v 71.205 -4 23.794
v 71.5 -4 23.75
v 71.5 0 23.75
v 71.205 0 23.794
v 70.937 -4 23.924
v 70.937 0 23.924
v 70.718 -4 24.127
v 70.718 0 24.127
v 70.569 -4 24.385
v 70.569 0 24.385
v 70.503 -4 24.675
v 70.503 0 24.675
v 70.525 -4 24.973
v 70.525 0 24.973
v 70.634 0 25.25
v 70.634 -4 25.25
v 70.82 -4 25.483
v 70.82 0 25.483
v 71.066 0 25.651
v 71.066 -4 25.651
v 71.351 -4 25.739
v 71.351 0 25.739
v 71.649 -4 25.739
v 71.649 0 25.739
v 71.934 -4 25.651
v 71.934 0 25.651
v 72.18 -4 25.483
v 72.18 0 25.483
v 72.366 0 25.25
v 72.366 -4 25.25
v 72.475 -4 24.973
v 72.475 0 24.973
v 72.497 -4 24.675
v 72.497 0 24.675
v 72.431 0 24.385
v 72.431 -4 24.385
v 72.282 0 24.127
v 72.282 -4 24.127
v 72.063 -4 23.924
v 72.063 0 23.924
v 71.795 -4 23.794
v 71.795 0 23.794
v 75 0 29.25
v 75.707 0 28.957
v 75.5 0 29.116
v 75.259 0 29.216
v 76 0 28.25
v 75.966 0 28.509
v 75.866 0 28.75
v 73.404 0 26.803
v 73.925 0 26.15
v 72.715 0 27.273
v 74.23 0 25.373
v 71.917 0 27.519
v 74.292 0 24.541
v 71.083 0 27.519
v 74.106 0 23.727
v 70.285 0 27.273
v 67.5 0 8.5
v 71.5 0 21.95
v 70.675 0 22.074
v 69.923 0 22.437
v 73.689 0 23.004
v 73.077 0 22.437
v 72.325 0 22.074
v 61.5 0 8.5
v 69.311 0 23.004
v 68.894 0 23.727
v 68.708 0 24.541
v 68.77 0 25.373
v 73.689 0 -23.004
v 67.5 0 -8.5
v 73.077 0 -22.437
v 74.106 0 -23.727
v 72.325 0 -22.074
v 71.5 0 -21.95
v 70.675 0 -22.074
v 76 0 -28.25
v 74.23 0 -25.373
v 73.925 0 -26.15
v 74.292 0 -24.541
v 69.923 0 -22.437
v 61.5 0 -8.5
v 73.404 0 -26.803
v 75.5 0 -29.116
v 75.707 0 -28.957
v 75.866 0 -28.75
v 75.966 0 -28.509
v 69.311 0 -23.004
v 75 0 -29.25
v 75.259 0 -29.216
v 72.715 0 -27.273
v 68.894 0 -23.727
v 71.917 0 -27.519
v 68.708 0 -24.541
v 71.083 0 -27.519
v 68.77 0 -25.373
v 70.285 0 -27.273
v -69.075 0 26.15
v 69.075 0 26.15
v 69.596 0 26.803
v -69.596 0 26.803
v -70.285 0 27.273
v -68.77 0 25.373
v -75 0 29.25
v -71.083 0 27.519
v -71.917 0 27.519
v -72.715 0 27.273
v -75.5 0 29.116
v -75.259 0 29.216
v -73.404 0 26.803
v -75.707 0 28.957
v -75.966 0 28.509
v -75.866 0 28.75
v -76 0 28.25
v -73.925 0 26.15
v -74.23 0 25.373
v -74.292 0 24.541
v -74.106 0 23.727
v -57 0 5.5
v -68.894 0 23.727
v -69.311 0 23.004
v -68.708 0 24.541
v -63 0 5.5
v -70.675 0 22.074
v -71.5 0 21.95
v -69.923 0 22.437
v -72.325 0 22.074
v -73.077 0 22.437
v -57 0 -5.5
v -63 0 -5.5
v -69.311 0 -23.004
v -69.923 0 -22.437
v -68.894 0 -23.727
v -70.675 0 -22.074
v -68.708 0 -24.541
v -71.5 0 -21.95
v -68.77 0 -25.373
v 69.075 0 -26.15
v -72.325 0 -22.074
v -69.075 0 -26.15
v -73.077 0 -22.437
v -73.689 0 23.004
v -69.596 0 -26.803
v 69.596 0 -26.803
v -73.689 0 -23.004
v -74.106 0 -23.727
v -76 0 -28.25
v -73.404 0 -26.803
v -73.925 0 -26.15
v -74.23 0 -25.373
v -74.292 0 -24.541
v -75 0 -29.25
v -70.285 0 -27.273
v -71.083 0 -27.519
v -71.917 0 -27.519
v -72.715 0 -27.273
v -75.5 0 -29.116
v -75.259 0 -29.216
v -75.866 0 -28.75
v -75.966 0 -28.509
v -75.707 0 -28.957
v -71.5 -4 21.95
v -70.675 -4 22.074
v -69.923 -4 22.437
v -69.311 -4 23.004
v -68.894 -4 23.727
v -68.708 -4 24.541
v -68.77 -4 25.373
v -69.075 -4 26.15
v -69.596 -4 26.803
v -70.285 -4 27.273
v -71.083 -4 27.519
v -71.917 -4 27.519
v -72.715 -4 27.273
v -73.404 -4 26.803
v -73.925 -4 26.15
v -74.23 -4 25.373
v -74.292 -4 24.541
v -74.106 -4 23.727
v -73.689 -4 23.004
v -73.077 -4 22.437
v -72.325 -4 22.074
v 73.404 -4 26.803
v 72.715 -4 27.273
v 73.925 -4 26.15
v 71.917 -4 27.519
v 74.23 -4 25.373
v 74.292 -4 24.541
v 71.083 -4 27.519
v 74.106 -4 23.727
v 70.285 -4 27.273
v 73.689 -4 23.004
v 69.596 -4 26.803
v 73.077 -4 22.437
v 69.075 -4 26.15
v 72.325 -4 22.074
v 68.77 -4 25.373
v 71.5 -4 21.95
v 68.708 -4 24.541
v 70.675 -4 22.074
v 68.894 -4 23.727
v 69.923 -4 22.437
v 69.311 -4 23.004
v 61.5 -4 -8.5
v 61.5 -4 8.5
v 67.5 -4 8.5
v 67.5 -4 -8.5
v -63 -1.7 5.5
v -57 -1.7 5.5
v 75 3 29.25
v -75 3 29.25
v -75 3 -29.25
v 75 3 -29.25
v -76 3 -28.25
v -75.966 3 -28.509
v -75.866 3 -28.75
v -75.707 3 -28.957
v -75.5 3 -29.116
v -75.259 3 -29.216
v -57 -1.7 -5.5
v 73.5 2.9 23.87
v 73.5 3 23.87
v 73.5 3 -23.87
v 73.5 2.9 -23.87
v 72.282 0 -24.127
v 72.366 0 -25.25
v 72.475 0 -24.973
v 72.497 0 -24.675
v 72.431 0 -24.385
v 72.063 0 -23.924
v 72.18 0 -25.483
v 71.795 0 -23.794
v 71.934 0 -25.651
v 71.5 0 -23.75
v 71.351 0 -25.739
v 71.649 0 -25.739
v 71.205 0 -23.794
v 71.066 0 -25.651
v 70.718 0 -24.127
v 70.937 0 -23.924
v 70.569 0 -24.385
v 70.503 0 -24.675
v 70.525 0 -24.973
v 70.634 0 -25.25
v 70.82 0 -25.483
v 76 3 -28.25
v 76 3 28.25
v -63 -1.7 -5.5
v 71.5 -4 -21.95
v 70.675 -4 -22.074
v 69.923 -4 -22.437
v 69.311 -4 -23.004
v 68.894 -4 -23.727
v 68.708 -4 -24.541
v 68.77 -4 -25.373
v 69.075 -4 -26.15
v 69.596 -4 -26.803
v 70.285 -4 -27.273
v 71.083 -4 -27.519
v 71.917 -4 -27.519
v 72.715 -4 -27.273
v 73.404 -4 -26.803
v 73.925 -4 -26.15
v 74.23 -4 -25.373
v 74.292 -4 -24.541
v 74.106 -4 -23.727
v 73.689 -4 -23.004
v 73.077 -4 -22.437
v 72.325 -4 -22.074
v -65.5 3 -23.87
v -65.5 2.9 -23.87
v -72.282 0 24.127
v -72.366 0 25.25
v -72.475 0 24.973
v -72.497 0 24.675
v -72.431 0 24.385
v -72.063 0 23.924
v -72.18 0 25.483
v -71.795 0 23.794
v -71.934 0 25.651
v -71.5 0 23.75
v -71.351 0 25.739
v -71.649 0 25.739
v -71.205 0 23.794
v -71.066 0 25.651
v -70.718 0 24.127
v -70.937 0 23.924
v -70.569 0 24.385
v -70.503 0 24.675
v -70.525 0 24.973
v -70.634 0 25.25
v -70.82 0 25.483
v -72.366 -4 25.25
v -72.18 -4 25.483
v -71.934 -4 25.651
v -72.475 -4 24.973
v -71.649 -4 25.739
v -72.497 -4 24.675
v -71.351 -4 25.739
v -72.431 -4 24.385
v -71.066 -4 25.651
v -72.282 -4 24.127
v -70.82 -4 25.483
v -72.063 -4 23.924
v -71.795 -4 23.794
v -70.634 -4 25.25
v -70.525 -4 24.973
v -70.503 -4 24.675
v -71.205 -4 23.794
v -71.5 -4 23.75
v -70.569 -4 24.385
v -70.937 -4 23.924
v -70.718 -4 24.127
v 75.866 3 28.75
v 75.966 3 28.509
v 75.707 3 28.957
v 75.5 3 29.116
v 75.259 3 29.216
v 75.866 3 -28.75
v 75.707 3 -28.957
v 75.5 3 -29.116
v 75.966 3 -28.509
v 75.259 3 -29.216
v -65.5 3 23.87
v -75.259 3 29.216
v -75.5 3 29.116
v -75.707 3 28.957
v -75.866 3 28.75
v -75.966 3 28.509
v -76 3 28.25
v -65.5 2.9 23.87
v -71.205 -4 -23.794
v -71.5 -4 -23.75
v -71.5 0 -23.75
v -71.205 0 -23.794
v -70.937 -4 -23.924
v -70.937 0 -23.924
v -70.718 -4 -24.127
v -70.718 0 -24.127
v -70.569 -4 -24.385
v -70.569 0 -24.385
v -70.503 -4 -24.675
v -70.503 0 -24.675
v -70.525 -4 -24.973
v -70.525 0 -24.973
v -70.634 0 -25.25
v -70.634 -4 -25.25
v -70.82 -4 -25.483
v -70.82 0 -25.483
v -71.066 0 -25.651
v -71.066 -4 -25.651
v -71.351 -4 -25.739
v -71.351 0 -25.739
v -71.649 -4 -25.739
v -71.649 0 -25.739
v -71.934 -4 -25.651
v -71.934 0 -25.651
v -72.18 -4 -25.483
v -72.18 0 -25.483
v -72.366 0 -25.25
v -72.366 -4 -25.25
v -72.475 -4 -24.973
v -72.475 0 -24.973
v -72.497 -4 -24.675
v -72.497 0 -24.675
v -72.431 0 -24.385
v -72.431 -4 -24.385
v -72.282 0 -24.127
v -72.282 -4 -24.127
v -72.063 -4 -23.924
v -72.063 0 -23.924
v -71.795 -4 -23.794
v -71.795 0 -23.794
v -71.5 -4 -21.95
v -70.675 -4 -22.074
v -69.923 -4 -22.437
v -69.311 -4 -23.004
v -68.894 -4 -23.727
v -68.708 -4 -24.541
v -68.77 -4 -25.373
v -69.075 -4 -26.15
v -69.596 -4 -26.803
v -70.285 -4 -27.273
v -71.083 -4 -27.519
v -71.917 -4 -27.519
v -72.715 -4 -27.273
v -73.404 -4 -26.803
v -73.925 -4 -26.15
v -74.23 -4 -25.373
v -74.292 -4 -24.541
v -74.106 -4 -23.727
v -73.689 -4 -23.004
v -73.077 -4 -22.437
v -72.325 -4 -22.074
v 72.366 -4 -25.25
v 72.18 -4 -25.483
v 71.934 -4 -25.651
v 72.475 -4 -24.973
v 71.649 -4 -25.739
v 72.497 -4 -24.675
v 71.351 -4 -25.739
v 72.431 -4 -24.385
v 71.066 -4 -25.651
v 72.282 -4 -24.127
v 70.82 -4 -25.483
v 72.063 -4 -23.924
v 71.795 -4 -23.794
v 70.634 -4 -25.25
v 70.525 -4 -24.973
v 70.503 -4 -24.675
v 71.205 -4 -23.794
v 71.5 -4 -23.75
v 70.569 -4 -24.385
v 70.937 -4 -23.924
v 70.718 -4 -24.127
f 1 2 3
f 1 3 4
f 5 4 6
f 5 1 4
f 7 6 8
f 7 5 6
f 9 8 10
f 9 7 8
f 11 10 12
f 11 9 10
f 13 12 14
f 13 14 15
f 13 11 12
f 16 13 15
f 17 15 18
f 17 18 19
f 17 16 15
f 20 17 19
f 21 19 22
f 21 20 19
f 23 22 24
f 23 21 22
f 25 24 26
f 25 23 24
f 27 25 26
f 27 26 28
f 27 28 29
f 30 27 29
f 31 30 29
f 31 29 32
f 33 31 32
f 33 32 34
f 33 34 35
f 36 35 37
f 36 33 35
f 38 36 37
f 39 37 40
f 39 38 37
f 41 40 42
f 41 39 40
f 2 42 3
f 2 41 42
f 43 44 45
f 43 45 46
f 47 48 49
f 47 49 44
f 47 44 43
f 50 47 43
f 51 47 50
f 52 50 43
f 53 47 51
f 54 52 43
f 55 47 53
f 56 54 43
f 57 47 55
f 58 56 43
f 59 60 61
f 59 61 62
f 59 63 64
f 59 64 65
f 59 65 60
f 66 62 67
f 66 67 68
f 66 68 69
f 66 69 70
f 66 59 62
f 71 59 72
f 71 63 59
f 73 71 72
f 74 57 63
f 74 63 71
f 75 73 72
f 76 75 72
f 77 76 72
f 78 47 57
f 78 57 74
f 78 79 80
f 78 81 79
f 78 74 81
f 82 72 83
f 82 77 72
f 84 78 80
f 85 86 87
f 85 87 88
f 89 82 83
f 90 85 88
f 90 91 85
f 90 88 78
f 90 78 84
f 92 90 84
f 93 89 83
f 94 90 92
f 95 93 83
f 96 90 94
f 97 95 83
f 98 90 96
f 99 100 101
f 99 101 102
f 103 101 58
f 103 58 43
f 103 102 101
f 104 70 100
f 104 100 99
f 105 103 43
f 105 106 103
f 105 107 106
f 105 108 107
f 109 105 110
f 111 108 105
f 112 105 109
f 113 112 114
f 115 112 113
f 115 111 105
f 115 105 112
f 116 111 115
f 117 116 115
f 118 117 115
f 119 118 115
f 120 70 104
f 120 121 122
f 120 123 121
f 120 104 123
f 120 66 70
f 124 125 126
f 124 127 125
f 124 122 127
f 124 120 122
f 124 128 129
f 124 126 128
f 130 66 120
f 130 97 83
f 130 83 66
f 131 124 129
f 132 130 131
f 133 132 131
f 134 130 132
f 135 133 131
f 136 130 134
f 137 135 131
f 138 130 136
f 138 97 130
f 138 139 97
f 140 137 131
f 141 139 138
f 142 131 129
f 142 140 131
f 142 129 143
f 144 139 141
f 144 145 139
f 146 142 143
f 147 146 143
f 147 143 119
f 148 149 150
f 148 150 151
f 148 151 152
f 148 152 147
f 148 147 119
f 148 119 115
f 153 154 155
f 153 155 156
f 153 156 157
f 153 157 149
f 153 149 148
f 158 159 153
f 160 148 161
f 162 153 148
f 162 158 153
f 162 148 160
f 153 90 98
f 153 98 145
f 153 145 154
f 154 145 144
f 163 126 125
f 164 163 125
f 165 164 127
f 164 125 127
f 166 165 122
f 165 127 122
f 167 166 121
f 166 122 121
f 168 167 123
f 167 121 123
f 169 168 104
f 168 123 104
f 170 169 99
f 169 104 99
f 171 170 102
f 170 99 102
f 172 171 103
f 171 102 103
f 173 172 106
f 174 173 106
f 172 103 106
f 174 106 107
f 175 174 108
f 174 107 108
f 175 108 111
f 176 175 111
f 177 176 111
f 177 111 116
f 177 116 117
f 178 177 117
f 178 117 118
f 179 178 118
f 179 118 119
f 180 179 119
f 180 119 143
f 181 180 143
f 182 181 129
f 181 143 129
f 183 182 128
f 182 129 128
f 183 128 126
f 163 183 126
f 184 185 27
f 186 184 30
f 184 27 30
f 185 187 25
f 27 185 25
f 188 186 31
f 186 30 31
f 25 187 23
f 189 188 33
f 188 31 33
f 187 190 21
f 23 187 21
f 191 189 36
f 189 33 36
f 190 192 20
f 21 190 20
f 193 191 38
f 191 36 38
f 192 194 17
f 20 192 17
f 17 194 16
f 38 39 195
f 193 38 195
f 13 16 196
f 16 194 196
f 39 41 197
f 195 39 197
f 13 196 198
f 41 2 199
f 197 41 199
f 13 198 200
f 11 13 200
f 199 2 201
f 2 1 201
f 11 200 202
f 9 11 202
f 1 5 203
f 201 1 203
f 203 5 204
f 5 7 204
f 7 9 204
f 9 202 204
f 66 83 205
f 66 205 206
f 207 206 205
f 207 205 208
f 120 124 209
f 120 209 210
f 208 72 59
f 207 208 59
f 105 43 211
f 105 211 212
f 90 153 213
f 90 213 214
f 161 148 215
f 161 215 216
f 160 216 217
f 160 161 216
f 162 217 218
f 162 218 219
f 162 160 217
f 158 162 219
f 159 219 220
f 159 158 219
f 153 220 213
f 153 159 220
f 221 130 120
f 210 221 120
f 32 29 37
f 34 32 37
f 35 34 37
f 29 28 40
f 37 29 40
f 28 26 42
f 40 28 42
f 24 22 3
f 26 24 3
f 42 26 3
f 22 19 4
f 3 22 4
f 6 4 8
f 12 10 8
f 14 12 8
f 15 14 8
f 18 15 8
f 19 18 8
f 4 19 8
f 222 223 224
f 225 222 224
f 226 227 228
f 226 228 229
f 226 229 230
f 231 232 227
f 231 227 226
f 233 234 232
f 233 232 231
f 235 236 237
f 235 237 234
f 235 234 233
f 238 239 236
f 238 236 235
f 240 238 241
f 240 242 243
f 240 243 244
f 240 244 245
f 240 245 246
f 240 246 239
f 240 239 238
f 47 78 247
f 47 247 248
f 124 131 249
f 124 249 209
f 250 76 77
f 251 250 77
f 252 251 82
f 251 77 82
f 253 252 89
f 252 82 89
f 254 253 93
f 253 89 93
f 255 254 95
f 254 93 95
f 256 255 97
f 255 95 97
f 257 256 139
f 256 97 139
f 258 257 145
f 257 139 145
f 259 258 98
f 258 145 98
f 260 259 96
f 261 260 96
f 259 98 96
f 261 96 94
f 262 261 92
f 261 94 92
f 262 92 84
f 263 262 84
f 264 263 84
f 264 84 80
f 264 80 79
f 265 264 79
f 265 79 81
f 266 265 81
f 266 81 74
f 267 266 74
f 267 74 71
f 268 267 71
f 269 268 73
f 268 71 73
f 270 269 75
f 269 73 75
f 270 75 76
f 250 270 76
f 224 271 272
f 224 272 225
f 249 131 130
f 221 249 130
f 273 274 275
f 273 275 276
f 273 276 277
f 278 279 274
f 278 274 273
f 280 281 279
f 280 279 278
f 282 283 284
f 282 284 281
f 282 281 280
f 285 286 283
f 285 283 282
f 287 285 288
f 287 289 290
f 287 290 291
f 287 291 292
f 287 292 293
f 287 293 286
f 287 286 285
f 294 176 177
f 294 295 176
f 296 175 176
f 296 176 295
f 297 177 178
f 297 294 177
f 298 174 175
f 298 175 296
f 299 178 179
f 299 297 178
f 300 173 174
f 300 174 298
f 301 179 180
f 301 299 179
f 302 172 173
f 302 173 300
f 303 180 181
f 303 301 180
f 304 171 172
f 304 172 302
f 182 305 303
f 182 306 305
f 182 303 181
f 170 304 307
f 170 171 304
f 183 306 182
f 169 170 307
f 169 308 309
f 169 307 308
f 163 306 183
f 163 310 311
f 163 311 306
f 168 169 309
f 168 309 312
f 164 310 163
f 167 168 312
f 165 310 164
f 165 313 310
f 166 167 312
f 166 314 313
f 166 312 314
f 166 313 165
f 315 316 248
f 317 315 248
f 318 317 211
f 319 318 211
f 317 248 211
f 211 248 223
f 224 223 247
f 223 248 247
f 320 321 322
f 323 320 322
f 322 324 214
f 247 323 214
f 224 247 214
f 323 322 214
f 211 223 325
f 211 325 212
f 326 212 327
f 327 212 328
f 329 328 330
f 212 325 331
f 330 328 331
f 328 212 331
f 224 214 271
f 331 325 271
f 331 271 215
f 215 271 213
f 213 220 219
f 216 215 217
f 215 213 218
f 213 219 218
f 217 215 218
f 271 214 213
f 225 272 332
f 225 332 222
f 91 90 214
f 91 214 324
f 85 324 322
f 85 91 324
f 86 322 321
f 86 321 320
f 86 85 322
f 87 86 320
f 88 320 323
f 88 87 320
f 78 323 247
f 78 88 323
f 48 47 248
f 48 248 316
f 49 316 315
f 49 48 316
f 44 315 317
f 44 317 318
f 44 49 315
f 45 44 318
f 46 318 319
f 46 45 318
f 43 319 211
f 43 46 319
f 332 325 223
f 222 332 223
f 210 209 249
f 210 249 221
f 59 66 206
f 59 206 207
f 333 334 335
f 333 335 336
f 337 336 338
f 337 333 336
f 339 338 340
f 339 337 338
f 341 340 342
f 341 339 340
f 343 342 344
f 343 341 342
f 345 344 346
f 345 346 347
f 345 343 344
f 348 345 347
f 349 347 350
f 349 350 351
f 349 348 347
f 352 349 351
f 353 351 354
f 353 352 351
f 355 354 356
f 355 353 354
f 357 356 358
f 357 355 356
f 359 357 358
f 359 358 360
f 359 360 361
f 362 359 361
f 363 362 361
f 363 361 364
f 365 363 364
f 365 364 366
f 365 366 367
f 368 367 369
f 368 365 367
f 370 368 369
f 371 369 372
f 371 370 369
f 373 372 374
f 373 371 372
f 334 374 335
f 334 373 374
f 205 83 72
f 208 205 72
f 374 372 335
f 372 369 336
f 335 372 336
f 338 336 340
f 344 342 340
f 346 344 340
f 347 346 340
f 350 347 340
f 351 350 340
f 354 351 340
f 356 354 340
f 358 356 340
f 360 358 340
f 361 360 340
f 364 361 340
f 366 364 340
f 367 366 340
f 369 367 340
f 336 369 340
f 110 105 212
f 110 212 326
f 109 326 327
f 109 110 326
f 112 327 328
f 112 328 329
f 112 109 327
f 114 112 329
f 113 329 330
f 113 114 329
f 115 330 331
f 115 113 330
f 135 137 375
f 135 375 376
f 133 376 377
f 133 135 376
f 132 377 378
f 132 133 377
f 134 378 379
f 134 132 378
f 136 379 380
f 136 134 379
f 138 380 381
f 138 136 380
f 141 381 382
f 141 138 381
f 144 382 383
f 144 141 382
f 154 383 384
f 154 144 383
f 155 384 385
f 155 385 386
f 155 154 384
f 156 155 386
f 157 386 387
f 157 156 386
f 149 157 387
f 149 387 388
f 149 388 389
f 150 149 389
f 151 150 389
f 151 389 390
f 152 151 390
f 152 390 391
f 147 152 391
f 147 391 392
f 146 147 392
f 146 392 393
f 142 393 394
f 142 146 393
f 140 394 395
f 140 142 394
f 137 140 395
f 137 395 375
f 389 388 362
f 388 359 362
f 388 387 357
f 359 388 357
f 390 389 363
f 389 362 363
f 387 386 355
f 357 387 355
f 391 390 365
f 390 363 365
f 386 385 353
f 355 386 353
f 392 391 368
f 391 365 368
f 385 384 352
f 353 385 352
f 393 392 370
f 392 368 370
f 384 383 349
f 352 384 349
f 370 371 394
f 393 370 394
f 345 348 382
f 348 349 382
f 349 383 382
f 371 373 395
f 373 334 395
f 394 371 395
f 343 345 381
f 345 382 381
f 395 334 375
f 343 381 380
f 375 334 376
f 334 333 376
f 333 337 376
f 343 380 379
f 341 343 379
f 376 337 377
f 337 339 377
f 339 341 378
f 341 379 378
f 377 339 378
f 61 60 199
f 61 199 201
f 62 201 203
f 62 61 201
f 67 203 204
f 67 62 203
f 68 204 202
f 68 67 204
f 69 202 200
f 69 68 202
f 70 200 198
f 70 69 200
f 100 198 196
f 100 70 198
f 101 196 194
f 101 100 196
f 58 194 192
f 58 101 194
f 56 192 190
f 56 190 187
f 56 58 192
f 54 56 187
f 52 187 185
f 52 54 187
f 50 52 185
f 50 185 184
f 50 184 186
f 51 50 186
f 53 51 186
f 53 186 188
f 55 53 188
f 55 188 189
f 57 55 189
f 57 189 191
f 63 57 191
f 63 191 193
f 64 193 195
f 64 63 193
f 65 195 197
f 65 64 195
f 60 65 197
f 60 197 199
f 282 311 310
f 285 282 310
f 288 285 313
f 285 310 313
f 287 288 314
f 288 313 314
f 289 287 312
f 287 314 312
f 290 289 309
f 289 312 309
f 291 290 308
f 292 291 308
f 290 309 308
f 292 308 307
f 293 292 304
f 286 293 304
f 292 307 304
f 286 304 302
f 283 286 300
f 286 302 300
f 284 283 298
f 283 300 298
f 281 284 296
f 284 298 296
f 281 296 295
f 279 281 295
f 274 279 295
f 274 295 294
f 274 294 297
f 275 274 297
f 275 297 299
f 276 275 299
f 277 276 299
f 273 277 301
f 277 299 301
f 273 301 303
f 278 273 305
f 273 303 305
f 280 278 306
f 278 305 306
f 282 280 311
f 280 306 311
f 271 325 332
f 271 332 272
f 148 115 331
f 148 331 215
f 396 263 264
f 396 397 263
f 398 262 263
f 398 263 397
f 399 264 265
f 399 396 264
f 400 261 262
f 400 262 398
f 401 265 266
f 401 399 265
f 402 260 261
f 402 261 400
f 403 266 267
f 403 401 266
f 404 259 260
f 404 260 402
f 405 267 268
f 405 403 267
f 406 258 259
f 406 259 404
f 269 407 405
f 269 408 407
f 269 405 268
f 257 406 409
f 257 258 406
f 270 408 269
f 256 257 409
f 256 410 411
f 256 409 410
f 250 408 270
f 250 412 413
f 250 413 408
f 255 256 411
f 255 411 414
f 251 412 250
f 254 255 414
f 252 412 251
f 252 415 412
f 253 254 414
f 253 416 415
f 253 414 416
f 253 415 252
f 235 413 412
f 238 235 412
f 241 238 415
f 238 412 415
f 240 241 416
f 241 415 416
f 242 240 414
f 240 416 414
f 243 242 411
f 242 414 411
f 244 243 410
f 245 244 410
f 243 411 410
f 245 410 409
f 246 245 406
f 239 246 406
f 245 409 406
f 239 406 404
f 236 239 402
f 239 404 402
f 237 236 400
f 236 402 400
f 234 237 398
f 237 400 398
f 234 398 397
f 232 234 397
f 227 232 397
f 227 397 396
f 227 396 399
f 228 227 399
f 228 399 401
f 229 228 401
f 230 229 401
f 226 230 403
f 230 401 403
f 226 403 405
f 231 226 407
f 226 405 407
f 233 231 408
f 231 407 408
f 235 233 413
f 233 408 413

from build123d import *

# Parameters (mm, degrees)
EXTRUDE_1_DEPTH                            = 3
SKETCH_2_W                                 = 139
SKETCH_2_H                                 = 47.74
CUT_EXTRUDE_1_DEPTH                        = 0.1
SKETCH_3_R                                 = 2.8
EXTRUDE_2_DEPTH                            = 4
SKETCH_4_R                                 = 1
CUT_EXTRUDE_2_DEPTH                        = 4
MIRROR_1_AT_THE_SECOND_PLANE_COPY_1_SKET_R = 2.8
MIRROR_1_AT_THE_SECOND_PLANE_COPY_1_DEPTH  = 4
MIRROR_1_AT_THE_SECOND_PLANE_COPY_2_SKET_R = 1
MIRROR_1_AT_THE_SECOND_PLANE_COPY_2_DEPTH  = 4
SKETCH_5_W                                 = 6
SKETCH_5_H                                 = 11
EXTRUDE_3_DEPTH                            = 1.7
SKETCH_6_W                                 = 6
SKETCH_6_H                                 = 17
EXTRUDE_4_DEPTH                            = 4


with BuildPart() as part:
    # ｽｹｯﾁ1 → ﾎﾞｽ - 押し出し1 (new body)
    with BuildSketch(Plane(origin=(0, 0, 0), x_dir=(1, 0, 0), z_dir=(0, 1, 0))):
        with BuildLine():
            Line((-75, 29.25), (75, 29.25))
            ThreePointArc((75, 29.25), (75.707106781, 28.957106781), (76, 28.25))
            Line((76, 28.25), (76, -28.25))
            ThreePointArc((76, -28.25), (75.707106781, -28.957106781), (75, -29.25))
            Line((75, -29.25), (-75, -29.25))
            ThreePointArc((-75, -29.25), (-75.707106781, -28.957106781), (-76, -28.25))
            Line((-76, -28.25), (-76, 28.25))
            ThreePointArc((-76, 28.25), (-75.707106781, 28.957106781), (-75, 29.25))
        make_face()
    extrude(amount=EXTRUDE_1_DEPTH)

    # ｽｹｯﾁ2 → ｶｯﾄ - 押し出し1 (cut)
    with BuildSketch(Plane(origin=(0, 3, 0), x_dir=(1, 0, 0), z_dir=(0, 1, 0))):
        with Locations((4, 0)):
            Rectangle(SKETCH_2_W, SKETCH_2_H)
    extrude(amount=-CUT_EXTRUDE_1_DEPTH, mode=Mode.SUBTRACT)

    # ｽｹｯﾁ3 → ﾎﾞｽ - 押し出し2 (add)
    with BuildSketch(Plane.XZ):
        with Locations(Location((-71.5, 24.75, 0), (0, 0, 270))):
            Circle(SKETCH_3_R)
    extrude_2 = extrude(amount=EXTRUDE_2_DEPTH)

    # ｽｹｯﾁ4 → ｶｯﾄ - 押し出し2 (cut)
    with BuildSketch(Plane.XZ.offset(4)):
        with Locations(Location((-71.5, 24.75, 0), (0, 0, 270))):
            Circle(SKETCH_4_R)
    cut_extrude_2 = extrude(amount=-CUT_EXTRUDE_2_DEPTH, mode=Mode.SUBTRACT)

    # ﾐﾗｰ1: ﾎﾞｽ - 押し出し2, ｶｯﾄ - 押し出し2 across plane
    add(extrude_2.mirror(Plane(origin=(0, 0, 0), x_dir=(0, 0, 1), z_dir=(1, 0, 0))))
    add(cut_extrude_2.mirror(Plane(origin=(0, 0, 0), x_dir=(0, 0, 1), z_dir=(1, 0, 0))), mode=Mode.SUBTRACT)

    # ﾐﾗｰ1 at the second plane: ﾎﾞｽ - 押し出し2, ｶｯﾄ - 押し出し2 across plane
    add(extrude_2.mirror(Plane.XY))
    add(cut_extrude_2.mirror(Plane.XY), mode=Mode.SUBTRACT)

    # ﾐﾗｰ1 at the second plane copy 1 sket → ﾐﾗｰ1 at the second plane copy 1 (add)
    with BuildSketch(Plane(origin=(0, 0, 0), x_dir=(-1, 0, 0), z_dir=(0, -1, 0))):
        with Locations(Location((-71.5, 24.75, 0), (0, 0, 270))):
            Circle(MIRROR_1_AT_THE_SECOND_PLANE_COPY_1_SKET_R)
    extrude(amount=MIRROR_1_AT_THE_SECOND_PLANE_COPY_1_DEPTH)

    # ﾐﾗｰ1 at the second plane copy 2 sket → ﾐﾗｰ1 at the second plane copy 2 (cut)
    with BuildSketch(Plane(origin=(0, -4, 0), x_dir=(-1, 0, 0), z_dir=(0, -1, 0))):
        with Locations(Location((-71.5, 24.75, 0), (0, 0, 270))):
            Circle(MIRROR_1_AT_THE_SECOND_PLANE_COPY_2_SKET_R)
    extrude(amount=-MIRROR_1_AT_THE_SECOND_PLANE_COPY_2_DEPTH, mode=Mode.SUBTRACT)

    # ｽｹｯﾁ5 → ﾎﾞｽ - 押し出し3 (add)
    with BuildSketch(Plane.XZ):
        with Locations((-60, 0)):
            Rectangle(SKETCH_5_W, SKETCH_5_H)
    extrude(amount=EXTRUDE_3_DEPTH)

    # ｽｹｯﾁ6 → ﾎﾞｽ - 押し出し4 (add)
    with BuildSketch(Plane.XZ):
        with Locations((64.5, 0)):
            Rectangle(SKETCH_6_W, SKETCH_6_H)
    extrude(amount=EXTRUDE_4_DEPTH)


solid = part.part
